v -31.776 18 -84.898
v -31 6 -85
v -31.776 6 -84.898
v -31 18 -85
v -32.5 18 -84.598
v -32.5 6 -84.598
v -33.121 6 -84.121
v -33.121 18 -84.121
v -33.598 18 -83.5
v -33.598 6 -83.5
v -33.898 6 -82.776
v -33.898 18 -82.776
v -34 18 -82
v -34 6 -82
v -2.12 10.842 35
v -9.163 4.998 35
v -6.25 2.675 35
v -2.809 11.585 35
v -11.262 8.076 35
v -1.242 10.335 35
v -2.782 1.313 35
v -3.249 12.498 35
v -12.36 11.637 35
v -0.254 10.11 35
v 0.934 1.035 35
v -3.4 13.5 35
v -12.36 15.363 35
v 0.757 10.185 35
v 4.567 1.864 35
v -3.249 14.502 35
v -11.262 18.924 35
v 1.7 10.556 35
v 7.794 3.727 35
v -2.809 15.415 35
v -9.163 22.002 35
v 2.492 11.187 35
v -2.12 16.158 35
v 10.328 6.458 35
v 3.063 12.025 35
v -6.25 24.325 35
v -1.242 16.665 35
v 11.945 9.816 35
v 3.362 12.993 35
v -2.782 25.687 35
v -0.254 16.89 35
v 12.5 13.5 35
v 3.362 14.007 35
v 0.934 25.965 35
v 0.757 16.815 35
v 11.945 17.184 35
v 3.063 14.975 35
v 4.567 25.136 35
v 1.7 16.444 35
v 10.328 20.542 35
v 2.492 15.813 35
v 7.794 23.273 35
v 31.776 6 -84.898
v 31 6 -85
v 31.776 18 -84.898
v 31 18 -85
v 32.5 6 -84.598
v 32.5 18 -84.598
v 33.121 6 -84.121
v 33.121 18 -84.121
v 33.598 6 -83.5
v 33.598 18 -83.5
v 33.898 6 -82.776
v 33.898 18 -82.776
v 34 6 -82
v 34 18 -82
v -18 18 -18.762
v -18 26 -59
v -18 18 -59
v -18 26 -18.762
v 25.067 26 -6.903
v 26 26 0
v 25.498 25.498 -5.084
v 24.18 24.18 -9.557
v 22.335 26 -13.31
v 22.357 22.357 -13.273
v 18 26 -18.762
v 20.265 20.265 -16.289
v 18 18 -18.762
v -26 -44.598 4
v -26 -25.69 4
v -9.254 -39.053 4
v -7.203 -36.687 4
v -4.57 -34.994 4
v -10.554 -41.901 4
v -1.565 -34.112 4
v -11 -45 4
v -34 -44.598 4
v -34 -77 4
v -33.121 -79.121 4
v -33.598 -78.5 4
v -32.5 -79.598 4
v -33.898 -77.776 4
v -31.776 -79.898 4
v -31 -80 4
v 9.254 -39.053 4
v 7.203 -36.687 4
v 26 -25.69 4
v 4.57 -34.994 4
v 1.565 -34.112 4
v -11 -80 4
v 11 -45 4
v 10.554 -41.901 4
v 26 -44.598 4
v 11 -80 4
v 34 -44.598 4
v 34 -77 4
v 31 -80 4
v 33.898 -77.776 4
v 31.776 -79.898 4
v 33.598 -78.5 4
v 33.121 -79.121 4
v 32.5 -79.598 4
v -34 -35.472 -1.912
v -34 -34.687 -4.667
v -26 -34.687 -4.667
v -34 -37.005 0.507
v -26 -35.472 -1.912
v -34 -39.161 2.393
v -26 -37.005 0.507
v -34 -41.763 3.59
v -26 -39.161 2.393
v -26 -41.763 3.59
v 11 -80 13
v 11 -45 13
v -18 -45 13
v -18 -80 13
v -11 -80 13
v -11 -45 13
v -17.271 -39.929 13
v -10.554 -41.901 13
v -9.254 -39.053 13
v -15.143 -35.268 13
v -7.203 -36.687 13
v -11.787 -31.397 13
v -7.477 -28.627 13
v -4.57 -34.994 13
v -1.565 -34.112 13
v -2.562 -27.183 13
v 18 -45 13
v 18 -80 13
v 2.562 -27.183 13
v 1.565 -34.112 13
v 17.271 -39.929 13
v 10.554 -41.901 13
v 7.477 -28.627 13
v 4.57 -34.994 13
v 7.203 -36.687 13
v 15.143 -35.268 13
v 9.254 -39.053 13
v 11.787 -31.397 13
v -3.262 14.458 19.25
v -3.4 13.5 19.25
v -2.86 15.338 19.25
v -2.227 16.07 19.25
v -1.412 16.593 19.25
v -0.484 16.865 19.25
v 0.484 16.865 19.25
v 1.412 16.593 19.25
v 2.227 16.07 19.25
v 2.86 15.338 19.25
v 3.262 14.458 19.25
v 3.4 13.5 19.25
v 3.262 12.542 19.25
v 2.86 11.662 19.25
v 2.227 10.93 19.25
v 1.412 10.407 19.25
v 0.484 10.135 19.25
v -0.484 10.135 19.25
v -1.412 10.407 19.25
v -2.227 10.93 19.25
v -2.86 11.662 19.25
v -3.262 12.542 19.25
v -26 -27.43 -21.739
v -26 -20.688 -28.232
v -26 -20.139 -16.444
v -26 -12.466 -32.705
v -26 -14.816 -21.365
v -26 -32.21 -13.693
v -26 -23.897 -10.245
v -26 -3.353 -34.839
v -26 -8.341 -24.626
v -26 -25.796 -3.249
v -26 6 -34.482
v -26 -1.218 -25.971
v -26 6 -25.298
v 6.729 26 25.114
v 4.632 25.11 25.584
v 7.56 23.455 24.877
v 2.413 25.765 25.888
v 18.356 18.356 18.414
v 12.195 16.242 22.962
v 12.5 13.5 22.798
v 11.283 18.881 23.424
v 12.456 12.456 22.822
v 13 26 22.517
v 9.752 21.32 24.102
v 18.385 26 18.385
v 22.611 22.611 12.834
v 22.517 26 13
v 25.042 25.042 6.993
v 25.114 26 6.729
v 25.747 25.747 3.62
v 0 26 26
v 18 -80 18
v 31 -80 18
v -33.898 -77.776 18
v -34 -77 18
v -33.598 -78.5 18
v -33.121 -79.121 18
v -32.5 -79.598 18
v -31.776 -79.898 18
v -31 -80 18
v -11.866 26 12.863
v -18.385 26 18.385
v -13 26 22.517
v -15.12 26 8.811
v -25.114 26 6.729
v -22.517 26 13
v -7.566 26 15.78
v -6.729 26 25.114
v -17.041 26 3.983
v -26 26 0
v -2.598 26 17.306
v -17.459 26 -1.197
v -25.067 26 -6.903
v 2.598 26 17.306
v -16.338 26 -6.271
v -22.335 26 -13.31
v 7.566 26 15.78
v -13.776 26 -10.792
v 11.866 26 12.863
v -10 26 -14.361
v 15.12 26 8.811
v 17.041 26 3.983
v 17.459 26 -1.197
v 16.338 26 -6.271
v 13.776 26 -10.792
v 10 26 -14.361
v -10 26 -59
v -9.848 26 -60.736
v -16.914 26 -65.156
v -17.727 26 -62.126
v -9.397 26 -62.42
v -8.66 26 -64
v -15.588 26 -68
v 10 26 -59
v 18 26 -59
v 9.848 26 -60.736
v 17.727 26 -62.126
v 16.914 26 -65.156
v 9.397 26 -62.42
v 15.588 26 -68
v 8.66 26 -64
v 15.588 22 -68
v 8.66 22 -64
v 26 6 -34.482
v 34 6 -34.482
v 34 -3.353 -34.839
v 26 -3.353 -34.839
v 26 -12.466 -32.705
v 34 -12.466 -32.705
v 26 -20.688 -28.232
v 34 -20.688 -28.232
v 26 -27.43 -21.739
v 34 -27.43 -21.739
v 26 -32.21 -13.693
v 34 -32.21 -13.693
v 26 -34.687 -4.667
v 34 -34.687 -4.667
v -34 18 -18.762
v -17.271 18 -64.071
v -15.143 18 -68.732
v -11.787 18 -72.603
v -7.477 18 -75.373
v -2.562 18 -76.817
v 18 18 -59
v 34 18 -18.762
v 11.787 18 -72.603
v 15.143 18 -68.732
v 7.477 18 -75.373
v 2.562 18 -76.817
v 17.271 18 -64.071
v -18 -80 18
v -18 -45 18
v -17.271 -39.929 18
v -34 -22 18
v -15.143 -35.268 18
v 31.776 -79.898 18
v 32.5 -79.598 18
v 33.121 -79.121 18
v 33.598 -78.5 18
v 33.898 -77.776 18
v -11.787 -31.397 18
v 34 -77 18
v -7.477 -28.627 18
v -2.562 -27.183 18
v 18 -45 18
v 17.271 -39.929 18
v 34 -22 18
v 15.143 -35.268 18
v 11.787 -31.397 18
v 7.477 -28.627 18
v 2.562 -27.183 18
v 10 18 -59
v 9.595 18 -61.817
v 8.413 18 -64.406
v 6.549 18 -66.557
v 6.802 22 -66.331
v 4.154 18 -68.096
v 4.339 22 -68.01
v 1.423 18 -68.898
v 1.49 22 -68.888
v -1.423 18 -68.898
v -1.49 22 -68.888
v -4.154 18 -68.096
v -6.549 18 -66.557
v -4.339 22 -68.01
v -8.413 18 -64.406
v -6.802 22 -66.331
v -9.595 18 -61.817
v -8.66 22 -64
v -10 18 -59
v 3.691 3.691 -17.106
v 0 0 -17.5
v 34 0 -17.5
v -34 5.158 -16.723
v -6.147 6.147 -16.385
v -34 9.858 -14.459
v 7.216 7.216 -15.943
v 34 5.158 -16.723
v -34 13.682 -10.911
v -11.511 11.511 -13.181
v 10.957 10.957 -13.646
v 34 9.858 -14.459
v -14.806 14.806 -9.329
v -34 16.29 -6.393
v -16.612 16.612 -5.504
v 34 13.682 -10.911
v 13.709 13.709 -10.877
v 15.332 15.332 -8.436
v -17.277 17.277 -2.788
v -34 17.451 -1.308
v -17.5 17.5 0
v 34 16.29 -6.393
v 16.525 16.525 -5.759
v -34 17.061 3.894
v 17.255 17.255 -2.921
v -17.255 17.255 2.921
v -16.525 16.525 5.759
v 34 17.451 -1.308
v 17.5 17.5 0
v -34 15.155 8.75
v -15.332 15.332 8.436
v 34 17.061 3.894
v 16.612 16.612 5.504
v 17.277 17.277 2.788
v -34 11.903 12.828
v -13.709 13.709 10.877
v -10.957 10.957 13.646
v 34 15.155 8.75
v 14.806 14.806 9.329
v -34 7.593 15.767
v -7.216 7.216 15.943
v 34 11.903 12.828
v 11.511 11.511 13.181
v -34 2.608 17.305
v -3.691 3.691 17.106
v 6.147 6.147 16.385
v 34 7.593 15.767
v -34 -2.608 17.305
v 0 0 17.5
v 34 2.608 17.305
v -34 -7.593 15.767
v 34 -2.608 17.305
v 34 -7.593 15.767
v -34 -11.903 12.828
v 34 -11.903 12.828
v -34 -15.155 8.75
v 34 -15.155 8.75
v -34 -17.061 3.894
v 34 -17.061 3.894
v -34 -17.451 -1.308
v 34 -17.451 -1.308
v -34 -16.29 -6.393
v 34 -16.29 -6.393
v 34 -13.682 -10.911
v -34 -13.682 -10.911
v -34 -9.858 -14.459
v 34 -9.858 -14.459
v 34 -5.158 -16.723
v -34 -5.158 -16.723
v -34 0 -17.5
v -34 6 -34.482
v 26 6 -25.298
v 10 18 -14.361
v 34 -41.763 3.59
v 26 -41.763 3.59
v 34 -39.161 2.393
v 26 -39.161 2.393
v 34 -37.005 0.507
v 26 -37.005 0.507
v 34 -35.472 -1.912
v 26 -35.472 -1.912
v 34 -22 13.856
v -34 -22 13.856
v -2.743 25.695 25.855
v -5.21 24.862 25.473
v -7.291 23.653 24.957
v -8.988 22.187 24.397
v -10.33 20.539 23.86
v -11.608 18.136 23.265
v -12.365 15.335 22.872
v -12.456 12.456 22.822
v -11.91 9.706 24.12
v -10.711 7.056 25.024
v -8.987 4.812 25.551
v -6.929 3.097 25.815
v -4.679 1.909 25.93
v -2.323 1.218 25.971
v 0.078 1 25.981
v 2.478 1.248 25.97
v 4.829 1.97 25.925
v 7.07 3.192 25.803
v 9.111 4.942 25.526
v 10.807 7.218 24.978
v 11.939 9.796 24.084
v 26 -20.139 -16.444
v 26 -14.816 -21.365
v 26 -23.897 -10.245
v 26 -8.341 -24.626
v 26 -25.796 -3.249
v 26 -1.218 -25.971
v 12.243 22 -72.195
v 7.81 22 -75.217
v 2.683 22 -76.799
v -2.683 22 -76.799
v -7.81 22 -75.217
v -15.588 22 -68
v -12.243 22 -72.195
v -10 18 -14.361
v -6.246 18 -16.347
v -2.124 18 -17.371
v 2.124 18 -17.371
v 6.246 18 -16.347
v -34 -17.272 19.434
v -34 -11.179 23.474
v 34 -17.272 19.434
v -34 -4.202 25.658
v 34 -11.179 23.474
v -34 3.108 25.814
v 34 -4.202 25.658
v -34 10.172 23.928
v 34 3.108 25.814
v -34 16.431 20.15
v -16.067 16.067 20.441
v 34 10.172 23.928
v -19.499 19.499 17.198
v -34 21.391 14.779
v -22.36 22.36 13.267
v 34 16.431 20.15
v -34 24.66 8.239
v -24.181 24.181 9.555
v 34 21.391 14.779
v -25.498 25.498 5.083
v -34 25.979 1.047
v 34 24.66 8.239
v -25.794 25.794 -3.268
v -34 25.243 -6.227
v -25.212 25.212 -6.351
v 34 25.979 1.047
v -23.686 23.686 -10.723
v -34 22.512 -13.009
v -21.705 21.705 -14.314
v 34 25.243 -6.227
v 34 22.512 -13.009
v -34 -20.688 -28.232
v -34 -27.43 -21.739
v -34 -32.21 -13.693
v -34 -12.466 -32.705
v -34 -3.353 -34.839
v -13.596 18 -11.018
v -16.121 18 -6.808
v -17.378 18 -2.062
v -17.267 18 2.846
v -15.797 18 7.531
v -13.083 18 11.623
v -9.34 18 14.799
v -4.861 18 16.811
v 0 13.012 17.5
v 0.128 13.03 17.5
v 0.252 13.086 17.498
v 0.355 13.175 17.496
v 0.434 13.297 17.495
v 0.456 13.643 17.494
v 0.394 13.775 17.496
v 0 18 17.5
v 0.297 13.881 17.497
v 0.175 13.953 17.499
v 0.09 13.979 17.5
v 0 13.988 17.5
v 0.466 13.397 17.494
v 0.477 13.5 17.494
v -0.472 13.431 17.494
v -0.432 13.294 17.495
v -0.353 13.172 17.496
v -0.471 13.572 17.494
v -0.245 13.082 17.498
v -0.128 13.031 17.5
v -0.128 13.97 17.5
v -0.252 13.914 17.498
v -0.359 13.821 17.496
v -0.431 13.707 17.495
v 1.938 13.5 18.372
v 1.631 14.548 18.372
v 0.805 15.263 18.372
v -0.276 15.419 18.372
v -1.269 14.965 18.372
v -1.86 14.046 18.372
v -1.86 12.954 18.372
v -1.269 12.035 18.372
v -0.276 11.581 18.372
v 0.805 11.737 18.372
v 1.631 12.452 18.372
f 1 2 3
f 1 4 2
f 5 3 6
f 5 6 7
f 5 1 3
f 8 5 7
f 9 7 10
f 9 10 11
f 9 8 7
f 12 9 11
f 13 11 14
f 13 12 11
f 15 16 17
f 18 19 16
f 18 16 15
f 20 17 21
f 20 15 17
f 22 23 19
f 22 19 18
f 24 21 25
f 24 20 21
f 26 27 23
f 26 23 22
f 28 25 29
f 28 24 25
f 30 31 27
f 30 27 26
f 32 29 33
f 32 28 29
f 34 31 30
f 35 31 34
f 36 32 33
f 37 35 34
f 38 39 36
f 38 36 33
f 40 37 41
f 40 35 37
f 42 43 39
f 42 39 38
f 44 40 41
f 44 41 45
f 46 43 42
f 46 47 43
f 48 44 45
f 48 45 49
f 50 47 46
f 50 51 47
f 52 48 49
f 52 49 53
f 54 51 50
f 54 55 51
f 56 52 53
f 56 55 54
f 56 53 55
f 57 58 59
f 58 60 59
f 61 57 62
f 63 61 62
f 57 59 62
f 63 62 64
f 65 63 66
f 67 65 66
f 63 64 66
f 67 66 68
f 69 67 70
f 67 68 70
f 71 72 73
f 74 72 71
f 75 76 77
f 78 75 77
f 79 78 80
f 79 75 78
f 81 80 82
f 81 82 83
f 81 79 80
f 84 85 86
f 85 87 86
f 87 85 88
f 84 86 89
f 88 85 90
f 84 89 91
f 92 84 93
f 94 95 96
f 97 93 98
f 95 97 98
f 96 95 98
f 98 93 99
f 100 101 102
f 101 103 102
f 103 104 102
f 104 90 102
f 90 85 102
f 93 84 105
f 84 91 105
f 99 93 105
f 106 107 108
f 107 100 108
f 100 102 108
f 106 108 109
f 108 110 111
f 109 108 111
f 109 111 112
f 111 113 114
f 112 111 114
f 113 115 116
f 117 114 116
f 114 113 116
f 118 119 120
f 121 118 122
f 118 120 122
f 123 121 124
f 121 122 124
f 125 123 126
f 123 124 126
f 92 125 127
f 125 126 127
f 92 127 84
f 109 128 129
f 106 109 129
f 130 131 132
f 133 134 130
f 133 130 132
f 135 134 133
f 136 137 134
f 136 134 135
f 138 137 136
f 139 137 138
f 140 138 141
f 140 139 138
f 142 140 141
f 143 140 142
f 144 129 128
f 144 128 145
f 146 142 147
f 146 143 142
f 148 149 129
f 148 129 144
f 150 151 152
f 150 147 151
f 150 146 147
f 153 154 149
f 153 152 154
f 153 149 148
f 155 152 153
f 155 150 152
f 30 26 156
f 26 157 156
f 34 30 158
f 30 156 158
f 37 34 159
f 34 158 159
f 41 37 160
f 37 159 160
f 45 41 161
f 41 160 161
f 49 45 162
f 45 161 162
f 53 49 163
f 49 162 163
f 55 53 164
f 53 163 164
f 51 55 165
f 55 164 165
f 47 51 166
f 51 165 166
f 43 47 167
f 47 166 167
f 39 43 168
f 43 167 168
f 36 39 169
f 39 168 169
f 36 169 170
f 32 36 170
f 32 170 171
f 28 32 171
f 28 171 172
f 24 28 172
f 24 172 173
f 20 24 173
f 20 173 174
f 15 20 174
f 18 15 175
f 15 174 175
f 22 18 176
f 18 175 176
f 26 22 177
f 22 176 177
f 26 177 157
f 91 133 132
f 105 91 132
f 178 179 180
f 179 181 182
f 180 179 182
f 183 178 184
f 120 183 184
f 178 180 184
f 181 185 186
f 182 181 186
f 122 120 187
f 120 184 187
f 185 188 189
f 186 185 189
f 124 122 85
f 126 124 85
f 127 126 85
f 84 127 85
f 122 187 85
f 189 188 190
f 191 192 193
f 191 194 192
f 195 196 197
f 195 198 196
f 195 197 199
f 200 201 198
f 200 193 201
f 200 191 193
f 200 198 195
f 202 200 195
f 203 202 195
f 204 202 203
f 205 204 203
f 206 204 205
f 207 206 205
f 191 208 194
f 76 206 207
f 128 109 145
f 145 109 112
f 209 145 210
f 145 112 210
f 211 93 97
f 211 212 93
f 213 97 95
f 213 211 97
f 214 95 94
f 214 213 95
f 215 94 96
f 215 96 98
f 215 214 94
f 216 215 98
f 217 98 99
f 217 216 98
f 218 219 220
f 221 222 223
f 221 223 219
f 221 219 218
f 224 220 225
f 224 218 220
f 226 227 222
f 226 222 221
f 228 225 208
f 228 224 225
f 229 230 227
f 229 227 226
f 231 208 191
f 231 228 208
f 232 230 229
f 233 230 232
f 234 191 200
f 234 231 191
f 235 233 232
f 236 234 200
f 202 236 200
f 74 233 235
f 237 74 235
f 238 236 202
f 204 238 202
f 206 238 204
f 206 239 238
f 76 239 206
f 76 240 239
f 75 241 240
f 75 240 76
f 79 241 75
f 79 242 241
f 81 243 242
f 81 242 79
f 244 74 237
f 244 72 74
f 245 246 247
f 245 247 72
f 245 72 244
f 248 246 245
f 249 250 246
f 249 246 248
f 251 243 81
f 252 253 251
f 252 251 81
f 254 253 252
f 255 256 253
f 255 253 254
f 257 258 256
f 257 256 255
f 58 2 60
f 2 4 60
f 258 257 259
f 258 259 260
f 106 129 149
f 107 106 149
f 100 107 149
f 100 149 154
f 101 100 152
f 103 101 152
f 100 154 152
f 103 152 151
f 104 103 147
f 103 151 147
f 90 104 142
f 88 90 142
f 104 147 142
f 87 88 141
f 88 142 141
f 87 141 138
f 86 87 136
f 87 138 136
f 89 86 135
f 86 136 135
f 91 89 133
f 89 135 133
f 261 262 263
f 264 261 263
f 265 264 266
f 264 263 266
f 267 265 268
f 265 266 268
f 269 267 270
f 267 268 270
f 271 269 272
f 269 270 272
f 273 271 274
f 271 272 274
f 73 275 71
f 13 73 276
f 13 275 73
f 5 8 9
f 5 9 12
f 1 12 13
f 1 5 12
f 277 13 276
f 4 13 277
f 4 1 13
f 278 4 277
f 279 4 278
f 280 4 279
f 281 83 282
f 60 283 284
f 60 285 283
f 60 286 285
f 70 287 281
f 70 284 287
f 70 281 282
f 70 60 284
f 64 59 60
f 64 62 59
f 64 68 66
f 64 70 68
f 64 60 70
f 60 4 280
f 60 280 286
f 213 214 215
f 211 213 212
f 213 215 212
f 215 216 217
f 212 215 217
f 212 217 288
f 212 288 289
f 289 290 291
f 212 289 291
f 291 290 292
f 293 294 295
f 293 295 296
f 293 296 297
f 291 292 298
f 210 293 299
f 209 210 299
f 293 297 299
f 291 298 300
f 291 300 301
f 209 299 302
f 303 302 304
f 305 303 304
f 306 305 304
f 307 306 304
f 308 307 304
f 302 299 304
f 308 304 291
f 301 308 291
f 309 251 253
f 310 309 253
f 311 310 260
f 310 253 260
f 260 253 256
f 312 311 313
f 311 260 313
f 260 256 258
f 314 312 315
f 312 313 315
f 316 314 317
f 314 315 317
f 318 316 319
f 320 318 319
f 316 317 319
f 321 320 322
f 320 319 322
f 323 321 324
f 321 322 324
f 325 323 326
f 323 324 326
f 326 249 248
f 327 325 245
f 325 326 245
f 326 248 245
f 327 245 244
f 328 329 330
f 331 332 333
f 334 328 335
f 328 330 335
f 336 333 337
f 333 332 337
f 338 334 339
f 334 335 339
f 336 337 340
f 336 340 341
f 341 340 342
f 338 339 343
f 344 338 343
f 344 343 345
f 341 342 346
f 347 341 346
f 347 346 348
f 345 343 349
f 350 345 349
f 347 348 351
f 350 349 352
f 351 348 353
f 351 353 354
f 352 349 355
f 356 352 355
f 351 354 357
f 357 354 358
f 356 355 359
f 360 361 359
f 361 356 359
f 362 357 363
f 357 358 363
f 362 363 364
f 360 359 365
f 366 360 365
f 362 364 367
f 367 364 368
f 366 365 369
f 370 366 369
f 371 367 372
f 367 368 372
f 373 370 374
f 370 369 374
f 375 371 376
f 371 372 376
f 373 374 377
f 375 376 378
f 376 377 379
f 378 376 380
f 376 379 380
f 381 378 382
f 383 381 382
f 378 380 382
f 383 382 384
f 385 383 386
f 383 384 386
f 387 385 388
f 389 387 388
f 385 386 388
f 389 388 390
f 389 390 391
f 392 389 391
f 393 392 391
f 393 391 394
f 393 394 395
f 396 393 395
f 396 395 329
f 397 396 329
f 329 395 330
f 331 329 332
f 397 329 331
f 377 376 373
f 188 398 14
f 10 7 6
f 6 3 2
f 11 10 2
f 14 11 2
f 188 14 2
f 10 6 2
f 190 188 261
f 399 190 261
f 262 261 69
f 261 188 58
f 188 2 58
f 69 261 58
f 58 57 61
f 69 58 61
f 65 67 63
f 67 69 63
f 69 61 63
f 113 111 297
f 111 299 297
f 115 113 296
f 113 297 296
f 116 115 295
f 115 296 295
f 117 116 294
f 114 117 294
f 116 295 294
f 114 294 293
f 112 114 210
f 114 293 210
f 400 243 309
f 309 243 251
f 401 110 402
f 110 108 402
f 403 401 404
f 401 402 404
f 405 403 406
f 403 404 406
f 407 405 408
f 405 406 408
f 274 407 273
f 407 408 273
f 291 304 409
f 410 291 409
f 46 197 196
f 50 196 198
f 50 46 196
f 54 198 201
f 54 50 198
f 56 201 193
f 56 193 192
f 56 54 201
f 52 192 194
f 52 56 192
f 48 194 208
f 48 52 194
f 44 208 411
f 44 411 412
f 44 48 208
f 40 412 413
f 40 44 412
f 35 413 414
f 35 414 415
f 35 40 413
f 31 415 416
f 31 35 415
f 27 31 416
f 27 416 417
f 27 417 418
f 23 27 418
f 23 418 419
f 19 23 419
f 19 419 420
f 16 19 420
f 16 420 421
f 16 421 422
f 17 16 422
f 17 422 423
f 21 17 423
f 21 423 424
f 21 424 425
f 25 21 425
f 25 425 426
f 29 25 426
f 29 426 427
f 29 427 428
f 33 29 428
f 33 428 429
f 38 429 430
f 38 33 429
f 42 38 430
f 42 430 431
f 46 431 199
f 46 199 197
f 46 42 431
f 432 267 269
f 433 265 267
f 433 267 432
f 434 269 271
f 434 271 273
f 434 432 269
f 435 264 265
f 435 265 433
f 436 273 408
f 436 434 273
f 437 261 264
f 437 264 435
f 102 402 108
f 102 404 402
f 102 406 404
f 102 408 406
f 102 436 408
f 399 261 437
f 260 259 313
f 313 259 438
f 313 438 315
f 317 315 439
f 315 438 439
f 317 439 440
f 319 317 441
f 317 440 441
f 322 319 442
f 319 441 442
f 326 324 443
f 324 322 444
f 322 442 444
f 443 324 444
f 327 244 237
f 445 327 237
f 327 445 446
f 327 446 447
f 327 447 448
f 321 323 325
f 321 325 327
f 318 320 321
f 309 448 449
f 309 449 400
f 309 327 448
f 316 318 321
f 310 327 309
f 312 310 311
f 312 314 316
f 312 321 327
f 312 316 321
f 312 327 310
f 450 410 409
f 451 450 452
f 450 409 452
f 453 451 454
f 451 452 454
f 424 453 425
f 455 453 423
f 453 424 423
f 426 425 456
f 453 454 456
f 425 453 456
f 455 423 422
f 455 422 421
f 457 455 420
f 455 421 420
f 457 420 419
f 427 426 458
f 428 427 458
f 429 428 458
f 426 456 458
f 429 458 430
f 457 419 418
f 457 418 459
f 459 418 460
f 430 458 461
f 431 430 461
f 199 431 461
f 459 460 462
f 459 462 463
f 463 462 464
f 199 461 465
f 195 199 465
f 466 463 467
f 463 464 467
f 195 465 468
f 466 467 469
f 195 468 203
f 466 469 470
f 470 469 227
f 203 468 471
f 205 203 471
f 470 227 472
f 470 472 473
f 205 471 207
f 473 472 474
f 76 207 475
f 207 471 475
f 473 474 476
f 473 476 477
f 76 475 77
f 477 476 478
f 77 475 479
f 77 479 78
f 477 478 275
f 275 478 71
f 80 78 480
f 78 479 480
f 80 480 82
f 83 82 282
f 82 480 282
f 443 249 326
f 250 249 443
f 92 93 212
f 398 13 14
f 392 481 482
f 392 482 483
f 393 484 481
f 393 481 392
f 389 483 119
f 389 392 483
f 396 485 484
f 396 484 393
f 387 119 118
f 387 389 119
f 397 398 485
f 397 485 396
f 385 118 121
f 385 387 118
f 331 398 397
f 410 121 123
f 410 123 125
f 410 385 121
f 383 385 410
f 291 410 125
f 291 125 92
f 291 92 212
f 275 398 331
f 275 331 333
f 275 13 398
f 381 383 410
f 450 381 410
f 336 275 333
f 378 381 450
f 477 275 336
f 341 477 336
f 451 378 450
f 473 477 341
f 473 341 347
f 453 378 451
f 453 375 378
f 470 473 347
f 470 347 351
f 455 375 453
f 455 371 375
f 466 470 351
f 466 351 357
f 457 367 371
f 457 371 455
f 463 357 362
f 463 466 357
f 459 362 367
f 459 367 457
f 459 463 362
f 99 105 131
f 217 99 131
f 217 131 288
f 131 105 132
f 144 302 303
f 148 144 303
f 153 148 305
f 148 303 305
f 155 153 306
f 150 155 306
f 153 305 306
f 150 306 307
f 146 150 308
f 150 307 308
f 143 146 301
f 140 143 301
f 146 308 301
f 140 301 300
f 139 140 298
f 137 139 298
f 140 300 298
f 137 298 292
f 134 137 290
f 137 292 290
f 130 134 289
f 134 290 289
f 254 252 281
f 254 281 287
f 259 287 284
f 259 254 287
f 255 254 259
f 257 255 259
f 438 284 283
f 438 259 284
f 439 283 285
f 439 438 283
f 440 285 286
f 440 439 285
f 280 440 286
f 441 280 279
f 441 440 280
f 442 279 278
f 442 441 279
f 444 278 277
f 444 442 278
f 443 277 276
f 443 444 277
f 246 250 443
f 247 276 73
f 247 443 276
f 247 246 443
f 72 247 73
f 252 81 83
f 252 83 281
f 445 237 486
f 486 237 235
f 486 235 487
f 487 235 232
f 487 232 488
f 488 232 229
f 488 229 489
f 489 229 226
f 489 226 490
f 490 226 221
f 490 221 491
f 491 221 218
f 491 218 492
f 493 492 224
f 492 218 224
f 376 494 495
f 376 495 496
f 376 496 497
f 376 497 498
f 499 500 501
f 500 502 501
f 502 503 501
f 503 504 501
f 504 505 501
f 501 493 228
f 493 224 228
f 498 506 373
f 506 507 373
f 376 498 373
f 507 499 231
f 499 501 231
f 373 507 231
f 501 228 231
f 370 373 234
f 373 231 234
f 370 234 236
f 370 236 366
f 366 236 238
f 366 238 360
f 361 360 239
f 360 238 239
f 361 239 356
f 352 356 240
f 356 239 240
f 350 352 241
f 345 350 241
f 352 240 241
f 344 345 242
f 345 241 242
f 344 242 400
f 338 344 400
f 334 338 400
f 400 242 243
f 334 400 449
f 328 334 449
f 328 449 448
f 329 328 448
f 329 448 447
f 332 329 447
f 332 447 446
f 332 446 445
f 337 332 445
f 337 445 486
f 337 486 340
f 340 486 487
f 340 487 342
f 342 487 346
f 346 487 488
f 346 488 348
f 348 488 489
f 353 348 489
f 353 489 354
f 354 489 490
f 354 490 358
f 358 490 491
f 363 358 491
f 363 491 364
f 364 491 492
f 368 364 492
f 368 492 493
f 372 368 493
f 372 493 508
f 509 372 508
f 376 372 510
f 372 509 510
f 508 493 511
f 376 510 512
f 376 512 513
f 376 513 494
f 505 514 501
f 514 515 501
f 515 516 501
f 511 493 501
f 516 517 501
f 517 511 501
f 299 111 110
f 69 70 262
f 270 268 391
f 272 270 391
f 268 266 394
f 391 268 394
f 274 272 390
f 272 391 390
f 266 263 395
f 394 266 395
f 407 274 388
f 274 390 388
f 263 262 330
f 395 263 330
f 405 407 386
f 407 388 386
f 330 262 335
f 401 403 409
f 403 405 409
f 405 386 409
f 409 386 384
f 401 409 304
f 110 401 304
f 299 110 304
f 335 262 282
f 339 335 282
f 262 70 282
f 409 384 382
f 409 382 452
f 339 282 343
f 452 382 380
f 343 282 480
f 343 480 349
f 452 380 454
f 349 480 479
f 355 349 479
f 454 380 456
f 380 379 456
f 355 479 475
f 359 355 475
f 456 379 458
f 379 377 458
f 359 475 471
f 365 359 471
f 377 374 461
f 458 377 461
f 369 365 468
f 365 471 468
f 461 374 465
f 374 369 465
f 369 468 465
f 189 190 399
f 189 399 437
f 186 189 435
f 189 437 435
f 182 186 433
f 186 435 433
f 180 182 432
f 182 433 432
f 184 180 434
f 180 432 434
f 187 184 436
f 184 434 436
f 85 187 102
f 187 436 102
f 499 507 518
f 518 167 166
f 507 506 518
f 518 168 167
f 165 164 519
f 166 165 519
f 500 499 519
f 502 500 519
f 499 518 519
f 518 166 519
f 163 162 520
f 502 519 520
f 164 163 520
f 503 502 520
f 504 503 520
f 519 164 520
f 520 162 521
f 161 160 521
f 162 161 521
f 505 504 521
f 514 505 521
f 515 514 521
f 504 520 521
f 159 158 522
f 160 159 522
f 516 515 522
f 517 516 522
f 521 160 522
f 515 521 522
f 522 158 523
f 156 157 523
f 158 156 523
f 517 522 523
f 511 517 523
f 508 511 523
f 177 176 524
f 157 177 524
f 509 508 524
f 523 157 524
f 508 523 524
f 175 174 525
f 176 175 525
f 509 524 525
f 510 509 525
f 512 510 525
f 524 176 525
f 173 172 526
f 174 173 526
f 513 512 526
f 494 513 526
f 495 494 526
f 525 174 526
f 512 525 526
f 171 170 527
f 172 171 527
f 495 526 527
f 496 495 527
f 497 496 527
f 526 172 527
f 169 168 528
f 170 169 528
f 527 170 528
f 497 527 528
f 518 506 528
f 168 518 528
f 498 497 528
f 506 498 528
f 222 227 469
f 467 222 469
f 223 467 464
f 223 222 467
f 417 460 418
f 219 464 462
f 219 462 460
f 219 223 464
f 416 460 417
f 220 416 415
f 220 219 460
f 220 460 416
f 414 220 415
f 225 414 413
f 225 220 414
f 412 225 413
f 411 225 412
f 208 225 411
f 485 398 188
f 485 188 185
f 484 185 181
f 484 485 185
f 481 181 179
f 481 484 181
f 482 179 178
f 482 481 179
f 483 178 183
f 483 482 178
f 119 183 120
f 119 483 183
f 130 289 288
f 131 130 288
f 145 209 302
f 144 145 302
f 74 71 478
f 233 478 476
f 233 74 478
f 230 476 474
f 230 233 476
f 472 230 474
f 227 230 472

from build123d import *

# Parameters (mm, degrees)
EXTRUDE_6_DEPTH        = 34
EXTRUDE_7_REACH        = 108.193
EXTRUDE_7_END_RADIUS   = 26
SKETCH_15_R            = 12.5
EXTRUDE_8_REACH        = 150.176
EXTRUDE_8_END_RADIUS   = 26
SKETCH_16_W            = 68
SKETCH_16_H            = 12
EXTRUDE_9_DEPTH        = 8
FILLET_2_R             = 10
EXTRUDE_10_DEPTH       = 19
CUT_EXTRUDE_7_DEPTH    = 8
SKETCH_20_R            = 17.5
CUT_EXTRUDE_8_DEPTH    = 68
CUT_EXTRUDE_9_REACH    = 136.108
SKETCH_21_R            = 17.5
CUT_EXTRUDE_10_DEPTH   = 5
CUT_EXTRUDE_11_DEPTH   = 9
CUT_EXTRUDE_12_DEPTH   = 4
FILLET_3_R             = 3
HOLE_WIZARD_M8_1_D     = 6.8
HOLE_WIZARD_M8_1_DEPTH = 15.75
HOLE_WIZARD_M8_1_TIP   = 2.042926105


with BuildPart() as part:
    # 草图1 → 凸台-拉伸6 (new, symmetric)
    with BuildSketch(Plane(origin=(0, 0, 0), x_dir=(0, 0, -1), z_dir=(1, 0, 0))):
        with BuildLine():
            Line((-18, -22), (-13.856406461, -22))
            ThreePointArc((-13.856406461, -22), (9.116890708, 24.349174602), (-4, -25.690465157))
            Line((-4, -25.690465157), (-4, -80))
            Line((-4, -80), (-18, -80))
            Line((-18, -80), (-18, -22))
        make_face()
    extrude(amount=EXTRUDE_6_DEPTH, both=True)

    # 凸台-拉伸7: up to this cylinder (the profile starts outside it)
    extrude_7_end = Plane(origin=(0, 0, 0), z_dir=(-1, 0, 0)) * Cylinder(EXTRUDE_7_END_RADIUS, 269.386, mode=Mode.PRIVATE)
    # 草图15 → 凸台-拉伸7 (add, up to the surface)
    with BuildSketch(Plane.XY.offset(35), mode=Mode.PRIVATE) as extrude_7_sk1:
        with Locations((0, 13.5)):
            Circle(SKETCH_15_R)
    extrude_7_tool1 = extrude(extrude_7_sk1.sketch, amount=-EXTRUDE_7_REACH, mode=Mode.PRIVATE) - extrude_7_end
    add(extrude_7_tool1.solids().sort_by_distance((0, 13.5, 35))[0])

    # 凸台-拉伸8: up to this cylinder (the profile starts outside it)
    extrude_8_end = Plane(origin=(0, 0, 0), z_dir=(-1, 0, 0)) * Cylinder(EXTRUDE_8_END_RADIUS, 353.352, mode=Mode.PRIVATE)
    # 草图16 → 凸台-拉伸8 (add, up to the surface)
    with BuildSketch(Plane.XY.offset(-85), mode=Mode.PRIVATE) as extrude_8_sk1:
        with Locations((0, 12)):
            Rectangle(SKETCH_16_W, SKETCH_16_H)
    extrude_8_tool1 = extrude(extrude_8_sk1.sketch, amount=EXTRUDE_8_REACH, mode=Mode.PRIVATE) - extrude_8_end
    add(extrude_8_tool1.solids().sort_by_distance((0, 12, -85))[0])

    # 草图17 → 凸台-拉伸9 (add)
    with BuildSketch(Plane(origin=(34, 0, 0), x_dir=(0, 0, -1), z_dir=(1, 0, 0))):
        with BuildLine():
            Line((-4, -34.770677301), (-4, -25.690465157))
            ThreePointArc((-4, -25.690465157), (19.091227119, -17.650072155), (25.298221281, 6))
            Line((25.298221281, 6), (34.481879299, 6))
            ThreePointArc((34.481879299, 6), (25.452863755, -24.023982324), (-4, -34.770677301))
        make_face()
    extrude_9 = extrude(amount=-EXTRUDE_9_DEPTH)

    # 镜向2: 凸台-拉伸9 across plane
    add(extrude_9.mirror(Plane(origin=(0, 0, 0), x_dir=(0, 0, 1), z_dir=(1, 0, 0))))

    # 圆角2
    fillet_2_edges = [part.edges().sort_by_distance(p)[0] for p in [
        (30, -34.770677301, 4),
        (-30, -34.770677301, 4),
    ]]
    fillet(fillet_2_edges, radius=FILLET_2_R)

    # 草图18 → 凸台-拉伸10 (add)
    with BuildSketch(Plane(origin=(0, 26, 0), x_dir=(1, 0, 0), z_dir=(0, 1, 0))):
        with BuildLine():
            Line((-18, 59), (-18, 18.761663039))
            ThreePointArc((-18, 18.761663039), (0, -26), (18, 18.761663039))
            Line((18, 18.761663039), (18, 59))
            ThreePointArc((18, 59), (0, 77), (-18, 59))
        make_face()
    extrude(amount=-EXTRUDE_10_DEPTH)

    # 草图19 → 切除-拉伸7 (cut)
    with BuildSketch(Plane(origin=(0, 26, 0), x_dir=(1, 0, 0), z_dir=(0, 1, 0))):
        with BuildLine():
            Line((-10, 59), (-10, 14.361406616))
            ThreePointArc((-10, 14.361406616), (0, -17.5), (10, 14.361406616))
            Line((10, 14.361406616), (10, 59))
            ThreePointArc((10, 59), (0, 69), (-10, 59))
        make_face()
    extrude(amount=-CUT_EXTRUDE_7_DEPTH, mode=Mode.SUBTRACT)

    # 草图20 → 切除-拉伸8 (cut)
    with BuildSketch(Plane(origin=(34, 0, 0), x_dir=(0, 0, -1), z_dir=(1, 0, 0))):
        Circle(SKETCH_20_R)
    extrude(amount=-CUT_EXTRUDE_8_DEPTH, mode=Mode.SUBTRACT)

    # 草图21 → 切除-拉伸9 (cut, up to next)
    with BuildSketch(Plane(origin=(0, 18, 0), x_dir=(1, 0, 0), z_dir=(0, 1, 0)), mode=Mode.PRIVATE) as cut_extrude_9_sk1:
        with Locations(Location((0, 0, 0), (0, 0, 270))):
            Circle(SKETCH_21_R)
    cut_extrude_9_tool1 = extrude(cut_extrude_9_sk1.sketch, amount=-CUT_EXTRUDE_9_REACH, mode=Mode.PRIVATE) & part.part
    add(cut_extrude_9_tool1.solids().sort_by_distance((0, 18, 0))[0], mode=Mode.SUBTRACT)

    # 草图22 → 切除-拉伸10 (cut)
    with BuildSketch(Plane.XY.offset(18)):
        with BuildLine():
            Line((-18, -45), (-18, -80))
            Line((-18, -80), (18, -80))
            Line((18, -80), (18, -45))
            ThreePointArc((18, -45), (0, -27), (-18, -45))
        make_face()
    extrude(amount=-CUT_EXTRUDE_10_DEPTH, mode=Mode.SUBTRACT)

    # 草图23 → 切除-拉伸11 (cut)
    with BuildSketch(Plane.XY.offset(13)):
        with BuildLine():
            Line((11, -80), (11, -45))
            ThreePointArc((11, -45), (0, -34), (-11, -45))
            Line((-11, -45), (-11, -80))
            Line((-11, -80), (11, -80))
        make_face()
    extrude(amount=-CUT_EXTRUDE_11_DEPTH, mode=Mode.SUBTRACT)

    # 草图24 → 切除-拉伸12 (cut)
    with BuildSketch(Plane(origin=(0, 26, 0), x_dir=(1, 0, 0), z_dir=(0, 1, 0))):
        with BuildLine():
            Line((0, 59), (-15.588457268, 68))
            ThreePointArc((-15.588457268, 68), (0, 77), (15.588457268, 68))
            Line((15.588457268, 68), (0, 59))
        make_face()
    extrude(amount=-CUT_EXTRUDE_12_DEPTH, mode=Mode.SUBTRACT)

    # 圆角3
    fillet_3_edges = [part.edges().sort_by_distance(p)[0] for p in [
        (34, 12, -85),
        (-34, 12, -85),
        (-34, -80, 11),
        (34, -80, 11),
    ]]
    fillet(fillet_3_edges, radius=FILLET_3_R)

    # M8 螺纹孔1
    with Locations(Plane(origin=(0, 13.5, 35), x_dir=(1, 0, 0), z_dir=(0, 0, 1))):
        with Locations((0, 0)):
            Hole(HOLE_WIZARD_M8_1_D / 2, depth=HOLE_WIZARD_M8_1_DEPTH)
            with Locations((0, 0, -(HOLE_WIZARD_M8_1_DEPTH + HOLE_WIZARD_M8_1_TIP / 2))):  # 118° drill point
                Cone(0, HOLE_WIZARD_M8_1_D / 2, HOLE_WIZARD_M8_1_TIP, mode=Mode.SUBTRACT)


solid = part.part
